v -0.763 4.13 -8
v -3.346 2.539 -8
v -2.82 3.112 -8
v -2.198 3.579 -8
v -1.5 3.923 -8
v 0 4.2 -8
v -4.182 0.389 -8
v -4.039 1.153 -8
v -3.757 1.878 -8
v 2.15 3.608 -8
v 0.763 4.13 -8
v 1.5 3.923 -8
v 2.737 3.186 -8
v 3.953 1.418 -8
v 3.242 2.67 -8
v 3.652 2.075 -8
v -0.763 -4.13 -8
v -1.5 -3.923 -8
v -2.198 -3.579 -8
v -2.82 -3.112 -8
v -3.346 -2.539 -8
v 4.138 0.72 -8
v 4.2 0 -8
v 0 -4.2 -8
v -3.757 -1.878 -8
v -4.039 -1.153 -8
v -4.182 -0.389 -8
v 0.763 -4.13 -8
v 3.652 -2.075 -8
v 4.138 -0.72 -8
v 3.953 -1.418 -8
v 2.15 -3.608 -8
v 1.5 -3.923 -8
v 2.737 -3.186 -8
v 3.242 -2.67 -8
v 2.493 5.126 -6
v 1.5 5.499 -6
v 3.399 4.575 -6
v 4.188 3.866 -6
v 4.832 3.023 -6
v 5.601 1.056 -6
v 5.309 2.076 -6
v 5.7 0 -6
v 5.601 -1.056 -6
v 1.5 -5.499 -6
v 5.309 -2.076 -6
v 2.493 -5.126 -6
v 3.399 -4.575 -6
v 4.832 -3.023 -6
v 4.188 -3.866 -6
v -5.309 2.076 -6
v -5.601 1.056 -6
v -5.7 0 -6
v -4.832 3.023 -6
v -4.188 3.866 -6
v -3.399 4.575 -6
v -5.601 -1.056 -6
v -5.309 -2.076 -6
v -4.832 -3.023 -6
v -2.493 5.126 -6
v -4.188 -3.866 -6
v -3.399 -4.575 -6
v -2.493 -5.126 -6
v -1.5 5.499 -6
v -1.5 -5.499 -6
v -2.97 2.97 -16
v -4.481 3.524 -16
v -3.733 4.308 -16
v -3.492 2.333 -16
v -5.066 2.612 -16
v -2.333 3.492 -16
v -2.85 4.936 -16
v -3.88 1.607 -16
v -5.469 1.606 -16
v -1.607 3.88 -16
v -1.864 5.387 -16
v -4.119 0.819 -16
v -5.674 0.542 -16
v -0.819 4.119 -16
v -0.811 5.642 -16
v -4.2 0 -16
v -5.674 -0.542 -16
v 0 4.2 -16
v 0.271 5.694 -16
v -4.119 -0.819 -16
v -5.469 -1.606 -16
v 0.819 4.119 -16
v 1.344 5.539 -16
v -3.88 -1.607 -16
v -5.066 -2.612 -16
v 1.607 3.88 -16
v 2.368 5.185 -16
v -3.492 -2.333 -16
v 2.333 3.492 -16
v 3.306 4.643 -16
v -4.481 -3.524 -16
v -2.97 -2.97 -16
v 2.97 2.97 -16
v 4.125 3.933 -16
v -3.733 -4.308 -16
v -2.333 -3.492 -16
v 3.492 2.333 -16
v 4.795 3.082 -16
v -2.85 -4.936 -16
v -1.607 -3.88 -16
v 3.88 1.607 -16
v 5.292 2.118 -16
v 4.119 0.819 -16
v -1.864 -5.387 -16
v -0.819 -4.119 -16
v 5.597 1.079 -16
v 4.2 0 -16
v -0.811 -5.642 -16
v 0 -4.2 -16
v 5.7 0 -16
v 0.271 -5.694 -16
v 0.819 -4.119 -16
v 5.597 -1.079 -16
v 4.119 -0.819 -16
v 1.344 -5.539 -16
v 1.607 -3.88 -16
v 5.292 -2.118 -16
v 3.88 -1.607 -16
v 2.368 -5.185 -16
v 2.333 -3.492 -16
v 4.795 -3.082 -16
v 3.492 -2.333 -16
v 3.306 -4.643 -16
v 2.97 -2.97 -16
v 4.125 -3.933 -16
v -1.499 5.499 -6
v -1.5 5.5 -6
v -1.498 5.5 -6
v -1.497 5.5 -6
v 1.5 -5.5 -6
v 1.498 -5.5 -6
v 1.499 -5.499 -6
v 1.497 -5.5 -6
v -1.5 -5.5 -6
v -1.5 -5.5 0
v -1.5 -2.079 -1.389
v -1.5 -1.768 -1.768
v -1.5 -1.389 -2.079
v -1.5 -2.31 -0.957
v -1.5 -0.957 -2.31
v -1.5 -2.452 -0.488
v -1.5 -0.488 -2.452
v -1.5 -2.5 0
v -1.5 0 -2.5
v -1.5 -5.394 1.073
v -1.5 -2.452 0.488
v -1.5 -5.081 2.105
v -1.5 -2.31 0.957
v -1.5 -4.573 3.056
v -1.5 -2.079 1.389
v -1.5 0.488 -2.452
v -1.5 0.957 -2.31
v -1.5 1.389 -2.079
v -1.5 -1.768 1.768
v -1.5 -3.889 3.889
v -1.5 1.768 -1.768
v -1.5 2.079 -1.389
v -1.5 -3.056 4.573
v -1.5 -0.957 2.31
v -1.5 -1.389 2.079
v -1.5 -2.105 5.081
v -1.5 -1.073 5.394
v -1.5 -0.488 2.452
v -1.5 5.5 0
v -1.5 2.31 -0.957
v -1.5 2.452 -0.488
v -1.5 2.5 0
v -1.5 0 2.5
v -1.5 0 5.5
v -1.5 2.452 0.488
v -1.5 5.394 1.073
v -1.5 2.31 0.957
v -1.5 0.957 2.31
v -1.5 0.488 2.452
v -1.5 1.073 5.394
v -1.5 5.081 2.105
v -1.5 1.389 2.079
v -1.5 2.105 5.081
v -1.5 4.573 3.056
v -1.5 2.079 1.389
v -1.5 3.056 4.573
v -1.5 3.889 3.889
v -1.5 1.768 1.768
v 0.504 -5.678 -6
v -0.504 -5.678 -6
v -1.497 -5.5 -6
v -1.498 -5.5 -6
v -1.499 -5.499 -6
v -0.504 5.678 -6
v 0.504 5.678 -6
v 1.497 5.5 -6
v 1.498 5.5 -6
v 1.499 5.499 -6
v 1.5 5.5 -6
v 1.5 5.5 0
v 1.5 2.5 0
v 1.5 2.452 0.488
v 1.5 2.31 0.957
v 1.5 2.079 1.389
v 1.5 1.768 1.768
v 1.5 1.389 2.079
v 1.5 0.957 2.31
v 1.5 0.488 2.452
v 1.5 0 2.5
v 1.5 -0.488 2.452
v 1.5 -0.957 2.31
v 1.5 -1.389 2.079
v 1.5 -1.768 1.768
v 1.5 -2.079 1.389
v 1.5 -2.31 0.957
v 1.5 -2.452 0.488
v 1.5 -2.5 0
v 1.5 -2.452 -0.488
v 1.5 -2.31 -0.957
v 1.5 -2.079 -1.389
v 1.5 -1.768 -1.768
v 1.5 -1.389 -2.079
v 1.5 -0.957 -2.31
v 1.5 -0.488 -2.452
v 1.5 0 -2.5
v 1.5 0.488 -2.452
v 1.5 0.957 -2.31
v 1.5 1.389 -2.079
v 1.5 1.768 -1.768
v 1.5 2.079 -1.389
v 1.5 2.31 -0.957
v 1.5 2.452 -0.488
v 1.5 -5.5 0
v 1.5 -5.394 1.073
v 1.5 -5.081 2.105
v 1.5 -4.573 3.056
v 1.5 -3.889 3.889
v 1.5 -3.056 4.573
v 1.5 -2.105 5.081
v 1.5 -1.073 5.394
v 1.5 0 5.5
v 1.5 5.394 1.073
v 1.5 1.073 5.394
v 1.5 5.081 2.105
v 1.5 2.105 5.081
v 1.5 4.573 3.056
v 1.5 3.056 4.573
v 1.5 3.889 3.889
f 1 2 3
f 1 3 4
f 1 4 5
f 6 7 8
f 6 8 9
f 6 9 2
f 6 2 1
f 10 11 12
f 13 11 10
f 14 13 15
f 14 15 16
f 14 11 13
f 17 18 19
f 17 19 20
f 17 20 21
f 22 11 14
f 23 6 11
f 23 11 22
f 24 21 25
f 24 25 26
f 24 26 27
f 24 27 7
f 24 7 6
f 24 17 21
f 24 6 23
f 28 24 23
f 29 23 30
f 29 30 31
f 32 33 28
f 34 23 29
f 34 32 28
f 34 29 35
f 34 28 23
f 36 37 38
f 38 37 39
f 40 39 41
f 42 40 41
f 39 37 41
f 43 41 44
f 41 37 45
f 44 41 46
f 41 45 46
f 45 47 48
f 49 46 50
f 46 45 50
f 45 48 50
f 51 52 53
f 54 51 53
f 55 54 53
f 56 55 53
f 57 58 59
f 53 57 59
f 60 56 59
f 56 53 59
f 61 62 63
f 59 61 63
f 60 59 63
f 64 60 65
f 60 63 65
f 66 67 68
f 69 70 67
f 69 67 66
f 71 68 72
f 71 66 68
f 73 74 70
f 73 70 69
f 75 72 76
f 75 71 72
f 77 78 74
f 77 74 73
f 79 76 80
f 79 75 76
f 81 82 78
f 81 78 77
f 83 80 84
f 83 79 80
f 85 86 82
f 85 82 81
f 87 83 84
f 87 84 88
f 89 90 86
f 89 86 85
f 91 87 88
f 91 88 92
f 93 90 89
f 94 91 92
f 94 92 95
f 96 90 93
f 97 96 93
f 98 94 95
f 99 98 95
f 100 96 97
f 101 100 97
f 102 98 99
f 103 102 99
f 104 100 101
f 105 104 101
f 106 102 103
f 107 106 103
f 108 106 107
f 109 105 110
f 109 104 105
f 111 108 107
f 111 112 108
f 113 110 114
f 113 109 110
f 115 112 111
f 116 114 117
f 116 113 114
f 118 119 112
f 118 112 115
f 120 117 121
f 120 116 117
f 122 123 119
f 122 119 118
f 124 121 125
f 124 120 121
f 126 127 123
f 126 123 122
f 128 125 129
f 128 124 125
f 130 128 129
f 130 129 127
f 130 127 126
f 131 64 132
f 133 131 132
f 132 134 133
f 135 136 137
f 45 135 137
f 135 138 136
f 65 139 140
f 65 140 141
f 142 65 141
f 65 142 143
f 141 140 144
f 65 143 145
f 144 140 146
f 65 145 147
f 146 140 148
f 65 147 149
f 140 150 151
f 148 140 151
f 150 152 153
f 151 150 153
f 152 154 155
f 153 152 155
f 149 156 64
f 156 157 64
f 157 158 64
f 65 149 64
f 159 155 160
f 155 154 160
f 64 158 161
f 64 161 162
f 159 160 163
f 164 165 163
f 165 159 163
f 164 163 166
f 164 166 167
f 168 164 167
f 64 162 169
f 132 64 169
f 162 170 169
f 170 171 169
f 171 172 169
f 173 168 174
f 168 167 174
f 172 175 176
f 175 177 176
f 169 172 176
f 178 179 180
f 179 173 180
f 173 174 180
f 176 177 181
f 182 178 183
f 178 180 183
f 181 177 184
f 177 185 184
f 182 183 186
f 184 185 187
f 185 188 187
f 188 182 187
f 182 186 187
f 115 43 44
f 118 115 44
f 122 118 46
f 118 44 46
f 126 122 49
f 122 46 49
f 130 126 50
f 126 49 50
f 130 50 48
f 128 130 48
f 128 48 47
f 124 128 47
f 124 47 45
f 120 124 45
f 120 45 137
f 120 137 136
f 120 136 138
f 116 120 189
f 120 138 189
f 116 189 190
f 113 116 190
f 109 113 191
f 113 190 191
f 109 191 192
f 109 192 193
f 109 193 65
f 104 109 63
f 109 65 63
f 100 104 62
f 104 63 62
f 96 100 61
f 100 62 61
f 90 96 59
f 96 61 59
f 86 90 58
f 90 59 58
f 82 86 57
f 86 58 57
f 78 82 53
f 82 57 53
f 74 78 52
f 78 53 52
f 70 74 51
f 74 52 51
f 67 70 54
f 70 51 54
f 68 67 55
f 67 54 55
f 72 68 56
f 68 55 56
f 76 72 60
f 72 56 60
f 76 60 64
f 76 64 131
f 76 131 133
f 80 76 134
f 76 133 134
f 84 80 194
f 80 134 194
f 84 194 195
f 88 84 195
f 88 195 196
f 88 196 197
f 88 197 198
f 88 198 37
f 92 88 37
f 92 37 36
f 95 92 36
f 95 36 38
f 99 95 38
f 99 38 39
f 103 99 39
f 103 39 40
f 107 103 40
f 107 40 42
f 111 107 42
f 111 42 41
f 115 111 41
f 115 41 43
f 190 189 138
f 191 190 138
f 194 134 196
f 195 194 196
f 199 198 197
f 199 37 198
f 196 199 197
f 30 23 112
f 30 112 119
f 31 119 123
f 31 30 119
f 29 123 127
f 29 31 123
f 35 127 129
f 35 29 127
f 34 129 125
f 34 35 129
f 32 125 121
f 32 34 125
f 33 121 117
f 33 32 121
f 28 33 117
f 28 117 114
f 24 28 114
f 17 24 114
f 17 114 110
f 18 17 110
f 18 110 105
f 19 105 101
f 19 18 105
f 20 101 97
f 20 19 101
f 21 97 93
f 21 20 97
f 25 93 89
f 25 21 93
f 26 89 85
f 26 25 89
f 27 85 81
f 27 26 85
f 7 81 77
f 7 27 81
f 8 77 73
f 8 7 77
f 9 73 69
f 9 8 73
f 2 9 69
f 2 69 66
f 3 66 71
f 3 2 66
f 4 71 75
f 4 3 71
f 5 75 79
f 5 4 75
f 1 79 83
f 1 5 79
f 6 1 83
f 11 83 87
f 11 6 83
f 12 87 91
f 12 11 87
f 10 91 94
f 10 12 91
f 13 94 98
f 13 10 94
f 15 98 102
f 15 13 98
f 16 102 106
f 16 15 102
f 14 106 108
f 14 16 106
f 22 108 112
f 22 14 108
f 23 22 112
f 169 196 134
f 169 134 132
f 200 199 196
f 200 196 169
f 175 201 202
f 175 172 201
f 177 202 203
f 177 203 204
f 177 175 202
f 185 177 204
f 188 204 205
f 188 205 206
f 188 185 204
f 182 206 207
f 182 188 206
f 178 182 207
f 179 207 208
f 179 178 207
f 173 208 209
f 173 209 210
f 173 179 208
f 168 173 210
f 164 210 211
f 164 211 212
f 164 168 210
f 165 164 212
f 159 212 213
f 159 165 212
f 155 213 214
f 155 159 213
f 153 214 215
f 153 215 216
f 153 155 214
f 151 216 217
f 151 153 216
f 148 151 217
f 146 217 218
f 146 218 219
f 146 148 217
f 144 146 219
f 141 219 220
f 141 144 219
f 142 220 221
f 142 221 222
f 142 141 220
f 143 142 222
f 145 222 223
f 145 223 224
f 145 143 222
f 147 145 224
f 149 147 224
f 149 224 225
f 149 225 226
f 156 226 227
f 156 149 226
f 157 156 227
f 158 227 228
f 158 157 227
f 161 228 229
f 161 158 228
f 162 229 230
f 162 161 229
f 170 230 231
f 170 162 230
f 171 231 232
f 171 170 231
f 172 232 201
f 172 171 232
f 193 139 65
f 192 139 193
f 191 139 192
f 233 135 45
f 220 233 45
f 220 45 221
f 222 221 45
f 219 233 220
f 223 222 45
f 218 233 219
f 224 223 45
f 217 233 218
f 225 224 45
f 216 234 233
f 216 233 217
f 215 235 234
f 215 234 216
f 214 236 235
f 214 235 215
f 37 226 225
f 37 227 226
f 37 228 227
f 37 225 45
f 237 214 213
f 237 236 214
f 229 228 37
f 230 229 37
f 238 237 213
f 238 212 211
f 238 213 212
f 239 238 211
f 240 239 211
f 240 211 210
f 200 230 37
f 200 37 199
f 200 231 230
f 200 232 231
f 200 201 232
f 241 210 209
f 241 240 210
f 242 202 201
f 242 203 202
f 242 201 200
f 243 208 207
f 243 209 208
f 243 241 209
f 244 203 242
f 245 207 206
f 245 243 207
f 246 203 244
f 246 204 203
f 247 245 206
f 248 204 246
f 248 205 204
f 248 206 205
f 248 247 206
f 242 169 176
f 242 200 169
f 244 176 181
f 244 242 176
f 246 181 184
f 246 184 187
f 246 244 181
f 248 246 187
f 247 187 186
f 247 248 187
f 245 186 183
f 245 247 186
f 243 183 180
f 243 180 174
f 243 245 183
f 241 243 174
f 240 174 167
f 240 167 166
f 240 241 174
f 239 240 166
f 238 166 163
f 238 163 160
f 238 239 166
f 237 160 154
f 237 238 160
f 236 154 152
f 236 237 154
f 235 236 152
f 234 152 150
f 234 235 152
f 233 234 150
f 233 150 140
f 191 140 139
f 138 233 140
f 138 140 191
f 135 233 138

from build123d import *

# Parameters (mm, degrees)
F0_R          = 2.5
F1_DEPTH      = 1.5
F1_DEPTH_BACK = 1.5
F3_DEPTH      = 2
F2_R          = 5.7
F2_R_2        = 4.2
F4_DEPTH      = 10


with BuildPart() as f1:
    # F0 (on Right) → F1 (new body, two sides)
    with BuildSketch(Plane.YZ) as f1_sk:
        with BuildLine():
            ThreePointArc((-5.5, 0), (0, -5.5), (5.5, 0))
            ThreePointArc((5.5, 0), (0, 5.5), (-5.5, 0))
        make_face()
        Circle(F0_R, mode=Mode.SUBTRACT)
        with BuildLine():
            Line((5.5, -6), (5.5, 0))
            ThreePointArc((5.5, 0), (0, -5.5), (-5.5, 0))
            Line((-5.5, 0), (-5.5, -6))
            Line((-5.5, -6), (5.5, -6))
        make_face()
    extrude(amount=F1_DEPTH)
    extrude(f1_sk.sketch, amount=-F1_DEPTH_BACK)

    # F2 (on face) → F3 (join)
    with BuildSketch(Plane(origin=(0, 0, -6), x_dir=(1, 0, 0), z_dir=(0, 0, -1))):
        with BuildLine():
            ThreePointArc((1.5, -3.9230090492), (3.4597687784, -2.38117618), (4.2, 0))
            ThreePointArc((4.2, 0), (3.4597687784, 2.38117618), (1.5, 3.9230090492))
            Line((1.5, 3.9230090492), (1.5, -3.9230090492))
        make_face()
        with BuildLine():
            Line((1.5, -3.9230090492), (1.5, 3.9230090492))
            ThreePointArc((1.5, 3.9230090492), (0, 4.2), (-1.5, 3.9230090492))
            Line((-1.5, 3.9230090492), (-1.5, -3.9230090492))
            ThreePointArc((-1.5, -3.9230090492), (0, -4.2), (1.5, -3.9230090492))
        make_face()
        with BuildLine():
            Line((-1.5, -3.9230090492), (-1.5, 3.9230090492))
            ThreePointArc((-1.5, 3.9230090492), (-4.2, 0), (-1.5, -3.9230090492))
        make_face()
    extrude(amount=F3_DEPTH)

    # F2 (on face) → F4 (join)
    with BuildSketch(Plane(origin=(0, 0, -6), x_dir=(1, 0, 0), z_dir=(0, 0, -1))):
        Circle(F2_R)
        Circle(F2_R_2, mode=Mode.SUBTRACT)
    extrude(amount=F4_DEPTH)


solid = f1.part
